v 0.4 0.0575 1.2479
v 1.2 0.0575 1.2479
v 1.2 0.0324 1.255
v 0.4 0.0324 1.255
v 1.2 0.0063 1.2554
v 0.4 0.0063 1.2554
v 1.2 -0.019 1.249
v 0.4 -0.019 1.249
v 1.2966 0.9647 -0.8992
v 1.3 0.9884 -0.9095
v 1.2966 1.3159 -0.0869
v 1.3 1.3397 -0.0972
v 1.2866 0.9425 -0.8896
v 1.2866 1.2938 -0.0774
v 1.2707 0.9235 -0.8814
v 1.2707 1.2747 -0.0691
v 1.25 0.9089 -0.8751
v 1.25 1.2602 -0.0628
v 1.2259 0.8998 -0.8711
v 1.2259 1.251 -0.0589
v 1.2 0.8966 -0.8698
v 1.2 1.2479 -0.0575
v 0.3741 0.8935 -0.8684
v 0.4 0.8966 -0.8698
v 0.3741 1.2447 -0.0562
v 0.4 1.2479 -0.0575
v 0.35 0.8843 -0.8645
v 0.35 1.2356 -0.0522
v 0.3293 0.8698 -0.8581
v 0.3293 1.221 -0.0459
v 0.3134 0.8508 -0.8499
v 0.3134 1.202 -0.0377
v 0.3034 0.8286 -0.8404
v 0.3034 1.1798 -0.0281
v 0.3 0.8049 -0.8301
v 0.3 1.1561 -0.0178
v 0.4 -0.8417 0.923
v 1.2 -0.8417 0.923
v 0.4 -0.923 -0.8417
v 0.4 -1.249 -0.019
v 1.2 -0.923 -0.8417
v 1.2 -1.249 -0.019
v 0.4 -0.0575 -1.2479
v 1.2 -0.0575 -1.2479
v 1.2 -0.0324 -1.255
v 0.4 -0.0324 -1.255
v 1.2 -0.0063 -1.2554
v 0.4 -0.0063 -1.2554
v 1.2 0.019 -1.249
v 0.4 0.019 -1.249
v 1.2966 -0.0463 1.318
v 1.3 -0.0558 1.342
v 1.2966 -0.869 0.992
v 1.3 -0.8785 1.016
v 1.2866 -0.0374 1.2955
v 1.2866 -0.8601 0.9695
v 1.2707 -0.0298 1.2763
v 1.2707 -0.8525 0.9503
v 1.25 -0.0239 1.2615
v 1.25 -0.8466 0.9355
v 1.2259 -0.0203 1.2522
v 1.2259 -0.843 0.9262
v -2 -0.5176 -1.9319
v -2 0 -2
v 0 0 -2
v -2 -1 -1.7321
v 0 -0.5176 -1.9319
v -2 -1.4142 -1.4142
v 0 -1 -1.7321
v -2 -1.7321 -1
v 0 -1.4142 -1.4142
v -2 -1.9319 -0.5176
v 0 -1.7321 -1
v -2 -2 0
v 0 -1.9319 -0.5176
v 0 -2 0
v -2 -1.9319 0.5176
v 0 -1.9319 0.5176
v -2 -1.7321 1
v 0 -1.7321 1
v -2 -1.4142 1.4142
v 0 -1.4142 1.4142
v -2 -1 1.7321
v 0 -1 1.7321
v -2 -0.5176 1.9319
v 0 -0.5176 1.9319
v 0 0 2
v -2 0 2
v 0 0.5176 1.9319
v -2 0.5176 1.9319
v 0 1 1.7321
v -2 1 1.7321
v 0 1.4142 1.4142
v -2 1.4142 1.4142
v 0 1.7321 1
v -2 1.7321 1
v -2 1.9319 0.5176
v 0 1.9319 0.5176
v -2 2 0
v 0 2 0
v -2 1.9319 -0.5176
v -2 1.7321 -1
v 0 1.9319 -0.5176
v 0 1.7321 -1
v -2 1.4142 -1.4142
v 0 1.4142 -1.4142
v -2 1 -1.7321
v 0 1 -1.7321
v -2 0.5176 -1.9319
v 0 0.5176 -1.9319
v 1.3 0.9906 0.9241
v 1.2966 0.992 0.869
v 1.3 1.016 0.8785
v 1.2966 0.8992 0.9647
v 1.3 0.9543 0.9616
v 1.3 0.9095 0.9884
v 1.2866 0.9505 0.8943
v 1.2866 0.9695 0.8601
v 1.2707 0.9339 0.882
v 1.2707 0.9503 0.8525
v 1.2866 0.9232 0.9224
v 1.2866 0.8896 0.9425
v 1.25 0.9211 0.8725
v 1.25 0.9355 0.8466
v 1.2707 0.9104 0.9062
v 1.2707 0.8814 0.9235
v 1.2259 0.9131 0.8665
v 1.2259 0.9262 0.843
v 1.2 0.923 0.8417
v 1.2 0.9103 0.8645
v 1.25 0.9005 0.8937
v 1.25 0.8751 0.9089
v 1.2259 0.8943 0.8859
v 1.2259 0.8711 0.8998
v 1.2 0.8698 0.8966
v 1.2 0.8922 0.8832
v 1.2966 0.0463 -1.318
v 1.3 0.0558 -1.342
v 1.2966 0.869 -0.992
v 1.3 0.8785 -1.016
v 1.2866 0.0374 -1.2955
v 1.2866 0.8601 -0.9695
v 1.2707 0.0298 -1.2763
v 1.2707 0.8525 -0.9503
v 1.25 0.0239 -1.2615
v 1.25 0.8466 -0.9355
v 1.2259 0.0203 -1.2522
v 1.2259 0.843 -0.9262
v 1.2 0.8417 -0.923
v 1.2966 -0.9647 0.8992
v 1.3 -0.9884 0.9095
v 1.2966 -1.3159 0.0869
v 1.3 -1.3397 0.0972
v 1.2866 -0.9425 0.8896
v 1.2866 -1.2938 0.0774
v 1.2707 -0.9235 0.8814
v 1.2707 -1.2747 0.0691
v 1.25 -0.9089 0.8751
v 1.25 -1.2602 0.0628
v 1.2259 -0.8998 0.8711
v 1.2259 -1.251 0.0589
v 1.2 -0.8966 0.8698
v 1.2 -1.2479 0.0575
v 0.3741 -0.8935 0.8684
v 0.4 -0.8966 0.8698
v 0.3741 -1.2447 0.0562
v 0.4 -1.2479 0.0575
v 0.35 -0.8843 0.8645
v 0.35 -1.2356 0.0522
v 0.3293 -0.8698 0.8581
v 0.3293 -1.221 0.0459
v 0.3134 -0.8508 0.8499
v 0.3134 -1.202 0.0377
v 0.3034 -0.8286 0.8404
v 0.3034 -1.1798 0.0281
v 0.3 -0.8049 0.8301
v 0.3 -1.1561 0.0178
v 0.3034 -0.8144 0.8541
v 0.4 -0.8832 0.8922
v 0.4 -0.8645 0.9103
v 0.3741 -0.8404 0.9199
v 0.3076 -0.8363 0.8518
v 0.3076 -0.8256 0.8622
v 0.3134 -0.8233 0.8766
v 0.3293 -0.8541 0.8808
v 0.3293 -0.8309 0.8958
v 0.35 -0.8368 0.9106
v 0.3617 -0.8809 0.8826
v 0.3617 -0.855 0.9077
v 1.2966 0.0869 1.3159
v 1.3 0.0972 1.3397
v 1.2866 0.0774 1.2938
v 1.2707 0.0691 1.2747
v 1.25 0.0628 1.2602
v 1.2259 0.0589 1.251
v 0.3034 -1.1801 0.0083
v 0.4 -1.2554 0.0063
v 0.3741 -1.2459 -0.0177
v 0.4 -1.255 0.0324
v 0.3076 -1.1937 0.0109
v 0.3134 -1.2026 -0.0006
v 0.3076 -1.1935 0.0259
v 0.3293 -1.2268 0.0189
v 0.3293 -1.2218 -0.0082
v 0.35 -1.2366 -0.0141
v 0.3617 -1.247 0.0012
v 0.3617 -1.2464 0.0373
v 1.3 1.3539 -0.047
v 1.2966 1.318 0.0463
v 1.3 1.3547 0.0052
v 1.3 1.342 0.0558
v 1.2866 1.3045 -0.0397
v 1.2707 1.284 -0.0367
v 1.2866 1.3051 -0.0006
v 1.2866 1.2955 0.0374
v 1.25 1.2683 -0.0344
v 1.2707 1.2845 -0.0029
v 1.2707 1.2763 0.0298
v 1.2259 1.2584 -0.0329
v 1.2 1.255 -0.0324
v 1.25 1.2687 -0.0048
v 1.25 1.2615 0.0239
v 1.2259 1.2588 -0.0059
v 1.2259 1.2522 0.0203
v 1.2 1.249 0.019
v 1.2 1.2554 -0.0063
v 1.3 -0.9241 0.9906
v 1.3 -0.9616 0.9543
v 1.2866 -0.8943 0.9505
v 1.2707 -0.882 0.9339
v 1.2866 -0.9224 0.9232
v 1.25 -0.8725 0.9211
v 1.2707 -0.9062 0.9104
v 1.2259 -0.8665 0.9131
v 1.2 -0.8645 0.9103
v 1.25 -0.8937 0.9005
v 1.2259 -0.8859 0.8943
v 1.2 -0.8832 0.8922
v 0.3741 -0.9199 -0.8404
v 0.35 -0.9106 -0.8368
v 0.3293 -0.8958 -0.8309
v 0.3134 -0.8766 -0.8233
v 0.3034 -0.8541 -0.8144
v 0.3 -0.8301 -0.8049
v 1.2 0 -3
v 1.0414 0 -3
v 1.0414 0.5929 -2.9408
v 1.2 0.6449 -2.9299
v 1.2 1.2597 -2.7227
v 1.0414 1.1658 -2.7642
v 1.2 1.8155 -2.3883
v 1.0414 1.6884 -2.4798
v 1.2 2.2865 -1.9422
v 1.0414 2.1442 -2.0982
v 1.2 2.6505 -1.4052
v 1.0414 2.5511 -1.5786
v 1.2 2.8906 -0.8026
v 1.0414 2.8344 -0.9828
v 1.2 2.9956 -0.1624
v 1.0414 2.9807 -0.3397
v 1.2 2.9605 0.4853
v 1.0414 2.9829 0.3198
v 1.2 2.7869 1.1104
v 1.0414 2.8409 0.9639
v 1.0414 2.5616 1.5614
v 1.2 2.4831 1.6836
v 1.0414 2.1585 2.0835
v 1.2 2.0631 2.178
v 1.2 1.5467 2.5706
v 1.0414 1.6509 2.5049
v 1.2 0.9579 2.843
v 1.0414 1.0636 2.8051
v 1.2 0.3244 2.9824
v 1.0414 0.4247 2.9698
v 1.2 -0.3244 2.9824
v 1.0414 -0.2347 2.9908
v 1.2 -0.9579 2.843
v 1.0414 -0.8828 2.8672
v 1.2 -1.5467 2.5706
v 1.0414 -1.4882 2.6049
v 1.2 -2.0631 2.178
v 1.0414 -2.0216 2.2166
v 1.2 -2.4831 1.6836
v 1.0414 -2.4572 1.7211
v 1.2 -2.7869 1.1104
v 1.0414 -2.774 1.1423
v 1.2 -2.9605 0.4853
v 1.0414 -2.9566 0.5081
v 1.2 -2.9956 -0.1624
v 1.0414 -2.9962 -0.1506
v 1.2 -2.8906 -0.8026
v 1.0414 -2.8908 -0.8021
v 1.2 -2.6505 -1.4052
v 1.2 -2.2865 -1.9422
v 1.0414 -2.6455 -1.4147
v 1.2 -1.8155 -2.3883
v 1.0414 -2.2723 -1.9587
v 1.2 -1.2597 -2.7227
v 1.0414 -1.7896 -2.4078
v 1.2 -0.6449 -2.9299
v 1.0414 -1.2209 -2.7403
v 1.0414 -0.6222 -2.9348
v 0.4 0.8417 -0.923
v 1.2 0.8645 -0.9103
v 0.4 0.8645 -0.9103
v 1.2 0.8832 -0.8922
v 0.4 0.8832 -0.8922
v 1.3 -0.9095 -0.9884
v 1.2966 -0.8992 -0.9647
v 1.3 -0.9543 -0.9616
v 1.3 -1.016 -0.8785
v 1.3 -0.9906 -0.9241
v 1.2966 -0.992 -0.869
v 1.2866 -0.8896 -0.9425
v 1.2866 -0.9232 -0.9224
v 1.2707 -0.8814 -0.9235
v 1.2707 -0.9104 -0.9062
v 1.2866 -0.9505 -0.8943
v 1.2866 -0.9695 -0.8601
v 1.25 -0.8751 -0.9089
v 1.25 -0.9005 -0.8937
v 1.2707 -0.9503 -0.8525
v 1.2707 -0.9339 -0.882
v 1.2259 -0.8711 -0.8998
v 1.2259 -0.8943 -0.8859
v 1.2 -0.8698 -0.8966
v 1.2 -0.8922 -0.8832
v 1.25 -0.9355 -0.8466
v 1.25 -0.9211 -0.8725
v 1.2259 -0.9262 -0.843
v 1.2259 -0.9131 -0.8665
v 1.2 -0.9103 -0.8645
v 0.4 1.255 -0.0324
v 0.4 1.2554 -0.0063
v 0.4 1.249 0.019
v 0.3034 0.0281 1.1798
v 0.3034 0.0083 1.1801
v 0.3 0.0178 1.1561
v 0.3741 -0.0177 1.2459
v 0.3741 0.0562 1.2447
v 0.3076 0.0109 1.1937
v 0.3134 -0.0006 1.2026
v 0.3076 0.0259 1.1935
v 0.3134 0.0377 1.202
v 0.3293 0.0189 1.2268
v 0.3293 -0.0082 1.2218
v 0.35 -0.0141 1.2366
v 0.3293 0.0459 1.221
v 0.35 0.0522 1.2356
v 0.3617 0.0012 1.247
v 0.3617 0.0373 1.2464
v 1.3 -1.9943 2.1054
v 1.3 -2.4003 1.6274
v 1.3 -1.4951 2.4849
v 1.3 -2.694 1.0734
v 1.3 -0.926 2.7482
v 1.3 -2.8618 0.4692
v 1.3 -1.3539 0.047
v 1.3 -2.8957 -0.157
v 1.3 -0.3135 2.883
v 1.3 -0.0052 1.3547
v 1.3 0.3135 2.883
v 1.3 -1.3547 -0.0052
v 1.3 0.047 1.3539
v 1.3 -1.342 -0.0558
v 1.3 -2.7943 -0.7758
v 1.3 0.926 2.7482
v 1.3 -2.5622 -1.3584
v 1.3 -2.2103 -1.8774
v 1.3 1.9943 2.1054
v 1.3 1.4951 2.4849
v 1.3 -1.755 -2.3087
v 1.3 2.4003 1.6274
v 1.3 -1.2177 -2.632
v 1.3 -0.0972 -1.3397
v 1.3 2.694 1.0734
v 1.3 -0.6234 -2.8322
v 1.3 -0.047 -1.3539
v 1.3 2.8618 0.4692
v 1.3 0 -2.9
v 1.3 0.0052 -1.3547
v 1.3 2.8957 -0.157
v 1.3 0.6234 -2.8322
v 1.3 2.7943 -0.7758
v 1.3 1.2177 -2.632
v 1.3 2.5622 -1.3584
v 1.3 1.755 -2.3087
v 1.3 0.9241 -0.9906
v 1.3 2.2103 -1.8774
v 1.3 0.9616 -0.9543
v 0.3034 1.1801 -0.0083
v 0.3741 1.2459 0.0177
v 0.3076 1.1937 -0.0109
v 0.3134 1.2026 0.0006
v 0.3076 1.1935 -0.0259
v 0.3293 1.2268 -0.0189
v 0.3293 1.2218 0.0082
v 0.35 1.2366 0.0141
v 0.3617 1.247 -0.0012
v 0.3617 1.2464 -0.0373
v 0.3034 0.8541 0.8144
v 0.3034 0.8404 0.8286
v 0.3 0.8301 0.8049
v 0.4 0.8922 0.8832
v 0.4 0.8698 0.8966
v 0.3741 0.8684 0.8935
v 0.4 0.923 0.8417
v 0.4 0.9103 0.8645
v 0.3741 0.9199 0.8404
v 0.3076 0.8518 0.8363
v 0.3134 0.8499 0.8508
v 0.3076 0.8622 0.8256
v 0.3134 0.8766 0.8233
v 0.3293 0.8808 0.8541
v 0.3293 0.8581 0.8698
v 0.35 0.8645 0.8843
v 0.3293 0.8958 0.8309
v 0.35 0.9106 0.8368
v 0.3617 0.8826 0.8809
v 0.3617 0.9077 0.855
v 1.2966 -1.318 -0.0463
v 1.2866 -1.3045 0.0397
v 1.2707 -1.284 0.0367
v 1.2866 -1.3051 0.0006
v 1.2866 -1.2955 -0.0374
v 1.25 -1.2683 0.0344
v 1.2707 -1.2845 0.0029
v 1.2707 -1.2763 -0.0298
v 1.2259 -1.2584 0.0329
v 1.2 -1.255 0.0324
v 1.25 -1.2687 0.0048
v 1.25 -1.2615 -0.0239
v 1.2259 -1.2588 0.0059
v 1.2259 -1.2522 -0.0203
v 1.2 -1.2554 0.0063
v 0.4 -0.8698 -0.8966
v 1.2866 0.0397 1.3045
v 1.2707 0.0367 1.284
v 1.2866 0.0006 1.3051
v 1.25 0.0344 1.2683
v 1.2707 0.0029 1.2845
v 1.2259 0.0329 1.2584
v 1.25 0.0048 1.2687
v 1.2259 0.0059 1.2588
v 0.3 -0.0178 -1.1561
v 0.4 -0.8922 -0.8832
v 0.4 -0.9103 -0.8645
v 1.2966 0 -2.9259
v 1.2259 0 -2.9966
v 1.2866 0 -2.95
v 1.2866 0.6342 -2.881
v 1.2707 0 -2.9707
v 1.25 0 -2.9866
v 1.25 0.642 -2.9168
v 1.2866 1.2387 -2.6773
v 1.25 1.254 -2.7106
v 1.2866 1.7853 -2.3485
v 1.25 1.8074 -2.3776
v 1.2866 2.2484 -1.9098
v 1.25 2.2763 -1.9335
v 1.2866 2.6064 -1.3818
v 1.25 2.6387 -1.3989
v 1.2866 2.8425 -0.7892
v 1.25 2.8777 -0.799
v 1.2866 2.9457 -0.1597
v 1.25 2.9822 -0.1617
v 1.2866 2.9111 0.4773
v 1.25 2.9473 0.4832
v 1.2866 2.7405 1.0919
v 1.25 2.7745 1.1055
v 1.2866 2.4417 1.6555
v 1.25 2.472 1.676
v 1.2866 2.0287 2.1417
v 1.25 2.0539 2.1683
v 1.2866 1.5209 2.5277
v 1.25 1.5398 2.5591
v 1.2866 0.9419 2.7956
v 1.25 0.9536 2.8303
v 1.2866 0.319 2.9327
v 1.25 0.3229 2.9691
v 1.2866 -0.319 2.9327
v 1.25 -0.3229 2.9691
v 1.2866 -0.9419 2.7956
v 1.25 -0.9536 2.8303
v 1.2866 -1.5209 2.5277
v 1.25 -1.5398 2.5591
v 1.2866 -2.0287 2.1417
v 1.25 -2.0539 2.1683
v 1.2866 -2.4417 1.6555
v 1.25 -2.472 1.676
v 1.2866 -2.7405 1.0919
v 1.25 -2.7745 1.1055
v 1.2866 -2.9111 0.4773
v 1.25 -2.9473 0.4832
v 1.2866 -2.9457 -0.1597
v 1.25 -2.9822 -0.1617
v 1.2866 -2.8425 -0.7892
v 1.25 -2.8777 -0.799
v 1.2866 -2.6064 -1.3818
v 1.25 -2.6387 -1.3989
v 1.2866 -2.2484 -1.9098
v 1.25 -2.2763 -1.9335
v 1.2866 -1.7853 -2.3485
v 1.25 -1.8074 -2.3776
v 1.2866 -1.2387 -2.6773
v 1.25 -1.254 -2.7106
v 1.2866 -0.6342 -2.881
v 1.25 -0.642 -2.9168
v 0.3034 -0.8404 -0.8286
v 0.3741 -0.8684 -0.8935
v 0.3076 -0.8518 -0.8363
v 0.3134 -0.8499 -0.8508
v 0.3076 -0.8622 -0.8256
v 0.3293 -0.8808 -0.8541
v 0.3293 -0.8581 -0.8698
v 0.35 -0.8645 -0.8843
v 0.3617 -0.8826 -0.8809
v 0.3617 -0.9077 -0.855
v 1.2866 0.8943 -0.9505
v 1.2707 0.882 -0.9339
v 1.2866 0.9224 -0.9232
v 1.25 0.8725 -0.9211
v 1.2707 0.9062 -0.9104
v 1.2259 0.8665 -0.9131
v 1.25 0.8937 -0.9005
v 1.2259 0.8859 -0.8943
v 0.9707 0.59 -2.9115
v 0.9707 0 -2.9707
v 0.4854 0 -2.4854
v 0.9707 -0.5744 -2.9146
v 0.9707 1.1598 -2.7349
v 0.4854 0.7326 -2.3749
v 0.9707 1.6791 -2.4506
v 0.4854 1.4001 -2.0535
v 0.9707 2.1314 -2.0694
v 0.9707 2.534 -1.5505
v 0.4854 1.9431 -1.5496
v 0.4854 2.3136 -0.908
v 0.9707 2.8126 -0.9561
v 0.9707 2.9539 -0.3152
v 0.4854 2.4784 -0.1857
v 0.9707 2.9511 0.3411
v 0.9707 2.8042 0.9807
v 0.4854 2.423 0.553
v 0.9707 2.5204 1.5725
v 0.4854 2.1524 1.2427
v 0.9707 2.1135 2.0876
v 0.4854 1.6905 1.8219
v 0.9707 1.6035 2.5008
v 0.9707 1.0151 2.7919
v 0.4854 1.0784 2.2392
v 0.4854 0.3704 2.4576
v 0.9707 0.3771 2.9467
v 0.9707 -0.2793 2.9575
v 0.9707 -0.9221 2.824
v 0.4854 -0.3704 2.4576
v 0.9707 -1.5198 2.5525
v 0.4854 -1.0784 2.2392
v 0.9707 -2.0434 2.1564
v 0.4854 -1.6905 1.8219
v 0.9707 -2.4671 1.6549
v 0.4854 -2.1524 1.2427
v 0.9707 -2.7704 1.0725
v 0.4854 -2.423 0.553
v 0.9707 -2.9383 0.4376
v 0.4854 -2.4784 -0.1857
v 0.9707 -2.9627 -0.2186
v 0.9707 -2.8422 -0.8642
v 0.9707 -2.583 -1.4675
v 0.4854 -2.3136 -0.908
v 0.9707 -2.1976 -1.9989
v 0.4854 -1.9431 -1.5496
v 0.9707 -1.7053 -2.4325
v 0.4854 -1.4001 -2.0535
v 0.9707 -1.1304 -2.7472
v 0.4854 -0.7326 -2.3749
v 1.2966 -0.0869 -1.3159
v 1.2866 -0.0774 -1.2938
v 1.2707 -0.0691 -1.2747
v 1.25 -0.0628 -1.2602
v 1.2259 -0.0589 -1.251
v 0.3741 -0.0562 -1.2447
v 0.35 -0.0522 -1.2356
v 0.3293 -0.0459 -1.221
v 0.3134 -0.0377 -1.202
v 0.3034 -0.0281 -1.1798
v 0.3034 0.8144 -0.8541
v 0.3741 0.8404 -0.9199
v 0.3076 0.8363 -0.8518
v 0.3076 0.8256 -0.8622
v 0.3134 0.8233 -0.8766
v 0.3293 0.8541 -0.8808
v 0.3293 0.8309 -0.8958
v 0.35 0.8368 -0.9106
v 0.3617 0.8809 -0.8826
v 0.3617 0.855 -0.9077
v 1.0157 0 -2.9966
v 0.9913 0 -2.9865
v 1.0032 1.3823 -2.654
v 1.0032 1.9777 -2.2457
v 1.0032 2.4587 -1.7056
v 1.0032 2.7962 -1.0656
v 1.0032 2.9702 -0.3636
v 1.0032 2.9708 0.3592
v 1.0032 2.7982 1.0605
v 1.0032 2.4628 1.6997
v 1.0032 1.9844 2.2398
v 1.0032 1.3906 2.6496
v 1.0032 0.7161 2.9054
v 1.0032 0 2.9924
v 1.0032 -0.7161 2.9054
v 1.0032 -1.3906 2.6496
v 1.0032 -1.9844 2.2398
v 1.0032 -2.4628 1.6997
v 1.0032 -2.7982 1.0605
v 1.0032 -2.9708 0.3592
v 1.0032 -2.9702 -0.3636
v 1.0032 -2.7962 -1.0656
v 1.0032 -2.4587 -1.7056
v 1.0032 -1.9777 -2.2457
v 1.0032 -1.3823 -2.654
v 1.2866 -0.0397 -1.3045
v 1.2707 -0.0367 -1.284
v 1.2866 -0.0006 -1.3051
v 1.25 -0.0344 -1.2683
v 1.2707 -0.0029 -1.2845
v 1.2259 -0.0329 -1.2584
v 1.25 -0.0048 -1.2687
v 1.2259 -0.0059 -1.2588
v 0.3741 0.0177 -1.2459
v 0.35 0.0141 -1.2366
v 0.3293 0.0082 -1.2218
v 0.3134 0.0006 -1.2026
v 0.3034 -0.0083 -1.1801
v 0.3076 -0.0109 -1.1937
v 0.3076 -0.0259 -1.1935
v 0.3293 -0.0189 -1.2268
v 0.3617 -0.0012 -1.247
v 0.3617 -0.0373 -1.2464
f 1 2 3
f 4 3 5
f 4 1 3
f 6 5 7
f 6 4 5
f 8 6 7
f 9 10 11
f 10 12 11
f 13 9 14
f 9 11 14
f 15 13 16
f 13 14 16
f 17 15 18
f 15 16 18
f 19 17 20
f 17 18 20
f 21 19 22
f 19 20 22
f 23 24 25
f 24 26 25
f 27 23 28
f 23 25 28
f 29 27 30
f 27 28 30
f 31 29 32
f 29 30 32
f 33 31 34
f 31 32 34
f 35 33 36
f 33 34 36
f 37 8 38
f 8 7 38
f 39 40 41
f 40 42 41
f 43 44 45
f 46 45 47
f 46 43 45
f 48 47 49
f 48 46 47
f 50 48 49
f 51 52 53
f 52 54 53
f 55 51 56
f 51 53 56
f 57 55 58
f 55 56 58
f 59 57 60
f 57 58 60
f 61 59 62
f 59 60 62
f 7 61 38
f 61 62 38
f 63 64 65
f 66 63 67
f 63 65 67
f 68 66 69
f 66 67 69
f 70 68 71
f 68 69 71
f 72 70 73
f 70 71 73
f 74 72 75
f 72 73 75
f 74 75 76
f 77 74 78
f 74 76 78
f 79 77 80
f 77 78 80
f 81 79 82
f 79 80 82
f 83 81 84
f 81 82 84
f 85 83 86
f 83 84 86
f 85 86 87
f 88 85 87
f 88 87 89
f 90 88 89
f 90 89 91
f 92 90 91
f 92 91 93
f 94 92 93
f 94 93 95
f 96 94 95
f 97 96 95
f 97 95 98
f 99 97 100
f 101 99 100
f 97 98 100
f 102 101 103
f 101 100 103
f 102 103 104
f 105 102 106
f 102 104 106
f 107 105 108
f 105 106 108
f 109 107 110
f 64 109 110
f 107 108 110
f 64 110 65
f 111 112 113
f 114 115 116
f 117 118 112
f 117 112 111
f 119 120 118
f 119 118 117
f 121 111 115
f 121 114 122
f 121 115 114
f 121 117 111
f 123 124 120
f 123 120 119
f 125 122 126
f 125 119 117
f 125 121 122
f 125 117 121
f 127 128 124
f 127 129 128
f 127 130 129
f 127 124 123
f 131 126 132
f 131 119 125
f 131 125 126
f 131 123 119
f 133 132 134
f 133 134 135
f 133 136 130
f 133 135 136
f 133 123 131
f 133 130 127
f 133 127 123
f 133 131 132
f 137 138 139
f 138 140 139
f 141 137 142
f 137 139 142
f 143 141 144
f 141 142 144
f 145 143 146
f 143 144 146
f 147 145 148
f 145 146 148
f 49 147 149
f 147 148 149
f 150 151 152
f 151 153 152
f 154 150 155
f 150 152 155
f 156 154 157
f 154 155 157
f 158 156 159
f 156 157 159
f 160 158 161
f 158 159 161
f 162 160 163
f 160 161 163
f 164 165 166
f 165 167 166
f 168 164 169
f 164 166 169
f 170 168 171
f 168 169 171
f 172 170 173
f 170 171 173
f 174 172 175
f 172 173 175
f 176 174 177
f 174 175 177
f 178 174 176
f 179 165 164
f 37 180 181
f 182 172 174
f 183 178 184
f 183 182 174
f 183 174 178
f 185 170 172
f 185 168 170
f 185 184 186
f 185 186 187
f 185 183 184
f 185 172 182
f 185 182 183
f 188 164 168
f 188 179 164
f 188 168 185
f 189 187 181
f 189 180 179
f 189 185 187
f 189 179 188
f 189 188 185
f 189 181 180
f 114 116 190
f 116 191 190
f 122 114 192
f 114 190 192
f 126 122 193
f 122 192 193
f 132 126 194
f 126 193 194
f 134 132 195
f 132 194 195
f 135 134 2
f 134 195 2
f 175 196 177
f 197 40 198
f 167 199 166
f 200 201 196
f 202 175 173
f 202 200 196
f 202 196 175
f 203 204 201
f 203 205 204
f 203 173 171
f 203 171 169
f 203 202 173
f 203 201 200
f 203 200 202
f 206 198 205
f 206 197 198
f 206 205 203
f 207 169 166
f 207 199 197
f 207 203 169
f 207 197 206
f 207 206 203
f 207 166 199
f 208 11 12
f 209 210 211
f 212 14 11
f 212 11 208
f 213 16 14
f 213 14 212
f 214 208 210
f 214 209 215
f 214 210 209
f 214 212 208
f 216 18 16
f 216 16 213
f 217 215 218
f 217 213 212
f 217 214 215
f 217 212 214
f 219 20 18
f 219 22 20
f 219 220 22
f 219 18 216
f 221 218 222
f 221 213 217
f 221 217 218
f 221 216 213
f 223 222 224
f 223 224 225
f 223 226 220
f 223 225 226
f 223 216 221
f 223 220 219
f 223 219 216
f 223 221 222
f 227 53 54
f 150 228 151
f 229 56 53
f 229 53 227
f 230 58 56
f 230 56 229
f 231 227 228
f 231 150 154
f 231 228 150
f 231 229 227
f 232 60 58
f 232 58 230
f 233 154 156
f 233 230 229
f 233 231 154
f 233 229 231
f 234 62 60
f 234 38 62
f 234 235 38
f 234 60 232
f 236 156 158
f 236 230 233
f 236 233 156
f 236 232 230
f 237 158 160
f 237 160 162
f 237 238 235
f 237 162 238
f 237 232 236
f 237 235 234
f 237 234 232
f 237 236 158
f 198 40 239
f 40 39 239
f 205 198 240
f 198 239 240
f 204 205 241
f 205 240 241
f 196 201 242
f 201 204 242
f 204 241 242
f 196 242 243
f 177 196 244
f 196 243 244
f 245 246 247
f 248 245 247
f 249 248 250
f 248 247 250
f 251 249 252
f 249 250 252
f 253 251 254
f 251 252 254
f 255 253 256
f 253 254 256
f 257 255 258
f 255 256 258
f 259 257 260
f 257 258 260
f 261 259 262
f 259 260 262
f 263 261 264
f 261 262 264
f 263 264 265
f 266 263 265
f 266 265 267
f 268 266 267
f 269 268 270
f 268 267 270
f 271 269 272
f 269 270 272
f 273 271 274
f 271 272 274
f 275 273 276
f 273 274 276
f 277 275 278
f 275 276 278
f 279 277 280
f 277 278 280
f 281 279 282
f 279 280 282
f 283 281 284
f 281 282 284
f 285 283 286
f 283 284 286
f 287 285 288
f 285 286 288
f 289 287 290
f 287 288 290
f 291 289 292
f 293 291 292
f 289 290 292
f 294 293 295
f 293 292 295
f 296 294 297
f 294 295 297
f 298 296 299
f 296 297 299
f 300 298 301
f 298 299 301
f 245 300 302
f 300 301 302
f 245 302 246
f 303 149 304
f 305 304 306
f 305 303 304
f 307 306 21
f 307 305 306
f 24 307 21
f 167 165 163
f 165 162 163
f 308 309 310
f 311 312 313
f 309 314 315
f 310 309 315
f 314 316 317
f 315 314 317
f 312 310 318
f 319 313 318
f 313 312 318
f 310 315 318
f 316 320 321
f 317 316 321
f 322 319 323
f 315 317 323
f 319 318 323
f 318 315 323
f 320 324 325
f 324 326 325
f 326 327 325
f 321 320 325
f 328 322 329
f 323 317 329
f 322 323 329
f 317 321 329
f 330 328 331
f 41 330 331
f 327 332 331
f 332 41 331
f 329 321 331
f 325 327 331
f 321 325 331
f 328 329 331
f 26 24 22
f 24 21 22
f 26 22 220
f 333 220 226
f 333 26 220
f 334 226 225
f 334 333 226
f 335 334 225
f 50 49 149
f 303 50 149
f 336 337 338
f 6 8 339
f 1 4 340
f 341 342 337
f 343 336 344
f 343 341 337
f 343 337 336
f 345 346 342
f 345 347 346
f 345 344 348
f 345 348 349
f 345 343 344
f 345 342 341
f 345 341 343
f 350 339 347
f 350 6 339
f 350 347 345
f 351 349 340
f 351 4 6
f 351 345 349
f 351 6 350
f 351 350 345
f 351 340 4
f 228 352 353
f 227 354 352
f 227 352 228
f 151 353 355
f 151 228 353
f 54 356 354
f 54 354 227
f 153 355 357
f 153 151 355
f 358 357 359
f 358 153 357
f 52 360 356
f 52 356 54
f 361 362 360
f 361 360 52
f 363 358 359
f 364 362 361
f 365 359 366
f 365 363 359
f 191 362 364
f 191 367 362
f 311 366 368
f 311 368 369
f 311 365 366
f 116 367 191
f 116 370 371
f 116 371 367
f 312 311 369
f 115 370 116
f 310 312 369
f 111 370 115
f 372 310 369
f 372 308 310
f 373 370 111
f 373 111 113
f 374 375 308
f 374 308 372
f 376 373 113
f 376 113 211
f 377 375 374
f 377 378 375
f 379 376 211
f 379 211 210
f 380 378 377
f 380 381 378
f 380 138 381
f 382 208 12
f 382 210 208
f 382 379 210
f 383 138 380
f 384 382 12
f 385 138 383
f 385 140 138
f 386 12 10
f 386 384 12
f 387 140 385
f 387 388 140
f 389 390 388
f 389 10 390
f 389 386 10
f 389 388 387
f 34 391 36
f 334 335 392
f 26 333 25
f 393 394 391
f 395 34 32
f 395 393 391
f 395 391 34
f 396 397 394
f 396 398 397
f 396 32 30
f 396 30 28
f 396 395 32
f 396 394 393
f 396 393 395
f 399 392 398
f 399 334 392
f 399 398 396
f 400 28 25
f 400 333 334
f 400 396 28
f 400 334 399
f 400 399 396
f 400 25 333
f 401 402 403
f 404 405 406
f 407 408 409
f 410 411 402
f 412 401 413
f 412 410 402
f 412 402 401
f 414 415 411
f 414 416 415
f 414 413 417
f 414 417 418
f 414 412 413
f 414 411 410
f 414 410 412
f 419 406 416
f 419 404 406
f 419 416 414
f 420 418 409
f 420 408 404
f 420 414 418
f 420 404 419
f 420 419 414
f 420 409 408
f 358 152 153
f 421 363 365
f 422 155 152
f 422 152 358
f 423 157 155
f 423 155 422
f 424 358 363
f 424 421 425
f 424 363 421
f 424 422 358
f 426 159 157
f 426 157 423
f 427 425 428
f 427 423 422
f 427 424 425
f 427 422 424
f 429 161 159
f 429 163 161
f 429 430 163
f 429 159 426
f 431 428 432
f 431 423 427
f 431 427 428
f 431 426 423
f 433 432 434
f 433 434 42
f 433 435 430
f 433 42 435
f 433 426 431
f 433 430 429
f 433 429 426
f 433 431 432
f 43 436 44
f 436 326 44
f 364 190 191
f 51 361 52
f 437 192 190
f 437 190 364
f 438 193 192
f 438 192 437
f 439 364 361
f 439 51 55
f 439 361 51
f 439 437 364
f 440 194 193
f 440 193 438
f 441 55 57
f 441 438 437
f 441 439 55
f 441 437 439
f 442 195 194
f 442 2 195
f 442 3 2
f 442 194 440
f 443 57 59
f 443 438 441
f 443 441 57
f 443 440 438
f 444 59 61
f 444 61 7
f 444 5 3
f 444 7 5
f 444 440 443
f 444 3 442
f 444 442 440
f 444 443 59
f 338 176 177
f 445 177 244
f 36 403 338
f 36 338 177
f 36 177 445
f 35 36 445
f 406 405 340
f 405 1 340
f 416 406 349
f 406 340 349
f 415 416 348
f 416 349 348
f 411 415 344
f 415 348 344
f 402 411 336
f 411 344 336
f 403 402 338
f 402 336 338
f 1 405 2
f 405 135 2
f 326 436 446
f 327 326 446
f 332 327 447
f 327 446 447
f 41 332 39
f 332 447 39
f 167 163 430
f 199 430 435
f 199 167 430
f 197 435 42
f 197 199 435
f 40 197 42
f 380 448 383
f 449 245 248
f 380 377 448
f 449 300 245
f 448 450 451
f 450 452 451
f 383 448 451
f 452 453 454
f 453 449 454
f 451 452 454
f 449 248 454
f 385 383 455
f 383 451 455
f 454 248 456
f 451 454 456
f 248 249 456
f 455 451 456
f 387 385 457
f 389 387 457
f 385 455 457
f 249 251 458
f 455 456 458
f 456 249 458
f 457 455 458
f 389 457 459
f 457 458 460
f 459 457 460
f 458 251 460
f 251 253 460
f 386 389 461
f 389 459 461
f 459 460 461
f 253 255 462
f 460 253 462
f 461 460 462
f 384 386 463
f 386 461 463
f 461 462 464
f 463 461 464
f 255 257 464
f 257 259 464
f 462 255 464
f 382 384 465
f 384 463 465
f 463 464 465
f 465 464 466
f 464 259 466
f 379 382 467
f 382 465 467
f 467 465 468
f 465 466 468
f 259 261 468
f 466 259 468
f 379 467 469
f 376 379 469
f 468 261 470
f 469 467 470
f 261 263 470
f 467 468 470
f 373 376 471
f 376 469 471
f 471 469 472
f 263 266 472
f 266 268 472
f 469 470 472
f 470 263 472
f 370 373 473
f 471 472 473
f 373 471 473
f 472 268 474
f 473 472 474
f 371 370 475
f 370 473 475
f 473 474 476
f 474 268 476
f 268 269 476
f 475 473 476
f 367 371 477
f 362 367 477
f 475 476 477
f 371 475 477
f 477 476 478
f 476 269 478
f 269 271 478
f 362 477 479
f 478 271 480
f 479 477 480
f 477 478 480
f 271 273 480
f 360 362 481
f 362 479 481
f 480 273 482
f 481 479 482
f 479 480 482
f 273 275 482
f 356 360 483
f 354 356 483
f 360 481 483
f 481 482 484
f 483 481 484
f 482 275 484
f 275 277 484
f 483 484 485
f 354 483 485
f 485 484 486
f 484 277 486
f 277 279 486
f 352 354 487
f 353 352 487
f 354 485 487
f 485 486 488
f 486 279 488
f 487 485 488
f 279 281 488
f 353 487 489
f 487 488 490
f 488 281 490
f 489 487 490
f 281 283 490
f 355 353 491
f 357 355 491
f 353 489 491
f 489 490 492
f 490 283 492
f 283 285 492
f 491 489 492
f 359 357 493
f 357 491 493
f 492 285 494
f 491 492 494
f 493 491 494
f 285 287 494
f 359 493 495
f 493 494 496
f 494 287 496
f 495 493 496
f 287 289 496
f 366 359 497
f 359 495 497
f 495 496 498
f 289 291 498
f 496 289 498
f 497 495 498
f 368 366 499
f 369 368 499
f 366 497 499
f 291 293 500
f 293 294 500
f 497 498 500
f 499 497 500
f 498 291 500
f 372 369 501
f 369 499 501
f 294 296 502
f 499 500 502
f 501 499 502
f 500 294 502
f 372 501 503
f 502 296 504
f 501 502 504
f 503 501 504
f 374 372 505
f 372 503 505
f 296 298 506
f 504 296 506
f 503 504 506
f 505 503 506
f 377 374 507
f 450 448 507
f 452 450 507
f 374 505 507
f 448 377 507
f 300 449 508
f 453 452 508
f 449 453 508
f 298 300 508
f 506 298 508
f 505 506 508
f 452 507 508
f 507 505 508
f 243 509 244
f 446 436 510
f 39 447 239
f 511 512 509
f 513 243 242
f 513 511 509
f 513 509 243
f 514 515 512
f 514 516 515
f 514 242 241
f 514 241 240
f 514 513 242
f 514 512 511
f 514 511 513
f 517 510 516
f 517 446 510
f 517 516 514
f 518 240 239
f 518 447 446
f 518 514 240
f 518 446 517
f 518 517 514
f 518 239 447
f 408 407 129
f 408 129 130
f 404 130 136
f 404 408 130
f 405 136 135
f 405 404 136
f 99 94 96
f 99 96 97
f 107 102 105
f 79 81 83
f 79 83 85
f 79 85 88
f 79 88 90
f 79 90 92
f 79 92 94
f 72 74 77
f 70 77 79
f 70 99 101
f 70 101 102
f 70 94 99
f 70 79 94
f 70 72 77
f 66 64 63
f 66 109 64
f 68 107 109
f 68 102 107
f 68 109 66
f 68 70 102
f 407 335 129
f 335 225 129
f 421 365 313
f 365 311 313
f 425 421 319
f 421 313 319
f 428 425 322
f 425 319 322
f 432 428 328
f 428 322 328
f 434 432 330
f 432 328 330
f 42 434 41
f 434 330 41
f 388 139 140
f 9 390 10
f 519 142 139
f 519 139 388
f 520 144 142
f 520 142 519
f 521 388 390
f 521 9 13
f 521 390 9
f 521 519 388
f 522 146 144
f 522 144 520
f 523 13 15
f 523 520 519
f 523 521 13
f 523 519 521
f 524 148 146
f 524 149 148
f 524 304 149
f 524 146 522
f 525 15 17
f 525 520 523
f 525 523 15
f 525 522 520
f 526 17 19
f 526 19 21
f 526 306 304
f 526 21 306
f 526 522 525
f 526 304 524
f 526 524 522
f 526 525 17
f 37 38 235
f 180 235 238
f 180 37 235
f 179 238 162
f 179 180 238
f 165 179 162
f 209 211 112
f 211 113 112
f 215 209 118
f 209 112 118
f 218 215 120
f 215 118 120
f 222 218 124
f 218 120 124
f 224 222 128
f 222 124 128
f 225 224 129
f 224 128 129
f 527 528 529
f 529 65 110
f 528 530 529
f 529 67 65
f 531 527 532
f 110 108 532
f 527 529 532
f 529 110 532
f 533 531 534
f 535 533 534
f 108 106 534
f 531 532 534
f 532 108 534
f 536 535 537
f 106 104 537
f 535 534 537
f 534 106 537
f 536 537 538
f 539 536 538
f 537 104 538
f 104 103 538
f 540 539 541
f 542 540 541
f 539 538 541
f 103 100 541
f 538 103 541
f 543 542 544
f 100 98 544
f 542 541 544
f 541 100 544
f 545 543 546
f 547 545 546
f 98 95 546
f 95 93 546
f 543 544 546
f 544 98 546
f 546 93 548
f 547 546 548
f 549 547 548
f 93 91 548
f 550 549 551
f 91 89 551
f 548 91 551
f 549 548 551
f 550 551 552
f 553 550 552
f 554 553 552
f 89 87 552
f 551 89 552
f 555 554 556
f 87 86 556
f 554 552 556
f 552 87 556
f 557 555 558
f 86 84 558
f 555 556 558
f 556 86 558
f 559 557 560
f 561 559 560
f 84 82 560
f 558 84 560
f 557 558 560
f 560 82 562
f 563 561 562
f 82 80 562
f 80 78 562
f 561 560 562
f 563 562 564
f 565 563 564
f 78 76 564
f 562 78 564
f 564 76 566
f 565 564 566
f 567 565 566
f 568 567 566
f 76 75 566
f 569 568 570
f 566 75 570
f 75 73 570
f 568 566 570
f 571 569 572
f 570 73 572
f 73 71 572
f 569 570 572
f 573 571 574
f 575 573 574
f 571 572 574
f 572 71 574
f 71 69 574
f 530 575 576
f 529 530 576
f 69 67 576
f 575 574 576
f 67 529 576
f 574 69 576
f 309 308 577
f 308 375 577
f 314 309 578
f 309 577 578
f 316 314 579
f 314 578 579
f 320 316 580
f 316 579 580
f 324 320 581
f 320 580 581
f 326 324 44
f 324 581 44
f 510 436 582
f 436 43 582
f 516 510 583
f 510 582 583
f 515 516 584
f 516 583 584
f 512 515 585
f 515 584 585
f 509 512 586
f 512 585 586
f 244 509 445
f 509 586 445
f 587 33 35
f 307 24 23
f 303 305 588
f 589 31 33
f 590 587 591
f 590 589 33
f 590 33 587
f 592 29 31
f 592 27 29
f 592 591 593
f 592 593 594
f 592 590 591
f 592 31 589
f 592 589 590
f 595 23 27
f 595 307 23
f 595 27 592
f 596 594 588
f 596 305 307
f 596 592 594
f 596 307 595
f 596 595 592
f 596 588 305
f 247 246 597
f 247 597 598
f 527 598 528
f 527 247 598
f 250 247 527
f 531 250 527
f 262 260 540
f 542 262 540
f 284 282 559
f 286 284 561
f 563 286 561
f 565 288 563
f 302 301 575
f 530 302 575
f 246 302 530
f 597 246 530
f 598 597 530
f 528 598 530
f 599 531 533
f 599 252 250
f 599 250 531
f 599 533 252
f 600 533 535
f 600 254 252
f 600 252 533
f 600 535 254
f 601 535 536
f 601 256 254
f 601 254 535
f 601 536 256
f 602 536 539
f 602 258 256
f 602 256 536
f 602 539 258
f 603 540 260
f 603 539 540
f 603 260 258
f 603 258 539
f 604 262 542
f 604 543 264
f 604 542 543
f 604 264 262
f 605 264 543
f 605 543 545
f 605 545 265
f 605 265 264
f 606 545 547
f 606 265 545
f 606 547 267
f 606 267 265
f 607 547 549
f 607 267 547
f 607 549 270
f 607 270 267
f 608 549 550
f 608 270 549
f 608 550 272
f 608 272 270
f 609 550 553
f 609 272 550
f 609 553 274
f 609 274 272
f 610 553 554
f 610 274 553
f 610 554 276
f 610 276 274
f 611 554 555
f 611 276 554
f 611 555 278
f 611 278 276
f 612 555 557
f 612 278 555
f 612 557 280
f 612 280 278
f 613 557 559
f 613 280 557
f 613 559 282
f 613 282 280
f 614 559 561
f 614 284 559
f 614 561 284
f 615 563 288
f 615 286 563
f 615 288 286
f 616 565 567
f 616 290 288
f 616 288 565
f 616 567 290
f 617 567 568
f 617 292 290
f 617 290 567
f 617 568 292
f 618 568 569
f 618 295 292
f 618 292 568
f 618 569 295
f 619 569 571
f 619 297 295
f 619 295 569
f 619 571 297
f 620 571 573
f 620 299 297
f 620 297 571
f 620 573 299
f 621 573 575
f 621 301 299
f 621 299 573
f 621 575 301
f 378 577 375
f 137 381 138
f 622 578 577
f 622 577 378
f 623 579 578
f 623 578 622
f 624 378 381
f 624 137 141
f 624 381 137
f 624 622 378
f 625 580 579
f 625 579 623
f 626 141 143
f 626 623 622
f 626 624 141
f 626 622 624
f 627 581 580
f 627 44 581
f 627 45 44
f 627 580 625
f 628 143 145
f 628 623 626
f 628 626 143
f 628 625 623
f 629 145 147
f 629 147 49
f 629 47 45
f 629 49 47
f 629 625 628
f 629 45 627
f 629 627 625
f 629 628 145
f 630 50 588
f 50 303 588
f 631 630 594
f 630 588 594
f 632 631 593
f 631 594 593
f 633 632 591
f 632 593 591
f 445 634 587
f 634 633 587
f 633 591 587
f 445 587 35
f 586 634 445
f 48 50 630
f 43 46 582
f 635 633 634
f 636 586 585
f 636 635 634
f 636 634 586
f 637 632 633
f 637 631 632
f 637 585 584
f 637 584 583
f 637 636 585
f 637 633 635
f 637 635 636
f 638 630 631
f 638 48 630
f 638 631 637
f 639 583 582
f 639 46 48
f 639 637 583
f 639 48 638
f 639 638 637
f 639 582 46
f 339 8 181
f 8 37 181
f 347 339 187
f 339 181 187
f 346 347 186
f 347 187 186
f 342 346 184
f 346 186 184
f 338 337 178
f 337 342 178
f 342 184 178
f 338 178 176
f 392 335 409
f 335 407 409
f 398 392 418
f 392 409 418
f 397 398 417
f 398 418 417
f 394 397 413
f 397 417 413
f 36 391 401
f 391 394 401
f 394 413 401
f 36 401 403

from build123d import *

# Parameters (mm, degrees)
SKETCH1_R           = 3
BOSS_EXTRUDE1_DEPTH = 1.3
CHAMFER1_SIZE       = 1
SKETCH2_R           = 2
BOSS_EXTRUDE2_DEPTH = 2
CUT_EXTRUDE3_DEPTH  = 1
FILLET1_R           = 0.1
FILLET2_R           = 0.1


with BuildPart() as part:
    # Sketch1 → Boss-Extrude1 (new body)
    with BuildSketch(Plane(origin=(0, 0, 0), x_dir=(0, 0, -1), z_dir=(1, 0, 0))):
        Circle(SKETCH1_R)
    extrude(amount=BOSS_EXTRUDE1_DEPTH)

    # Chamfer1
    chamfer1_edges = [part.edges().sort_by_distance(p)[0] for p in [
        (0, 0, 3),
    ]]
    chamfer(chamfer1_edges, length=CHAMFER1_SIZE)

    # Sketch2 → Boss-Extrude2 (add)
    with BuildSketch(Plane.ZY):
        with Locations(Location((0, 0, 0), (0, 0, 180))):
            Circle(SKETCH2_R)
    extrude(amount=BOSS_EXTRUDE2_DEPTH)

    # Sketch4 → Cut-Extrude3 (cut)
    with BuildSketch(Plane(origin=(1.3, 0, 0), x_dir=(0, 0, -1), z_dir=(1, 0, 0))):
        Polygon((0.880205355, -0.907790138), (1.264303737, -0.019505387), (0.907790138, 0.880205355), (0.019505387, 1.264303737), (-0.880205355, 0.907790138), (-1.264303737, 0.019505387), (-0.907790138, -0.880205355), (-0.019505387, -1.264303737), align=None)
    extrude(amount=-CUT_EXTRUDE3_DEPTH, mode=Mode.SUBTRACT)

    # Fillet1
    fillet1_edges = [part.edges().sort_by_distance(p)[0] for p in [
        (0.3, -0.463647763, -1.072254546),
        (0.8, -0.019505387, -1.264303737),
        (0.3, -1.086046938, -0.430349984),
        (0.8, -0.907790138, -0.880205355),
        (0.3, -1.072254546, 0.463647763),
        (0.8, -1.264303737, 0.019505387),
        (0.3, -0.430349984, 1.086046938),
        (0.8, -0.880205355, 0.907790138),
        (0.3, 0.463647763, 1.072254546),
        (0.8, 0.019505387, 1.264303737),
        (0.3, 1.086046938, 0.430349984),
        (0.8, 0.907790138, 0.880205355),
        (0.3, 1.072254546, -0.463647763),
        (0.8, 1.264303737, -0.019505387),
        (0.3, 0.430349984, -1.086046938),
        (0.8, 0.880205355, -0.907790138),
        (1.3, -0.463647763, -1.072254546),
        (1.3, 0.430349984, -1.086046938),
        (1.3, 1.072254546, -0.463647763),
        (1.3, 1.086046938, 0.430349984),
        (1.3, 0.463647763, 1.072254546),
        (1.3, -0.430349984, 1.086046938),
        (1.3, -1.072254546, 0.463647763),
        (1.3, -1.086046938, -0.430349984),
    ]]
    fillet(fillet1_edges, radius=FILLET1_R)

    # Fillet2
    fillet2_edges = [part.edges().sort_by_distance(p)[0] for p in [
        (1.3, 0, 3),
        (1, 0, 3),
    ]]
    fillet(fillet2_edges, radius=FILLET2_R)


solid = part.part
